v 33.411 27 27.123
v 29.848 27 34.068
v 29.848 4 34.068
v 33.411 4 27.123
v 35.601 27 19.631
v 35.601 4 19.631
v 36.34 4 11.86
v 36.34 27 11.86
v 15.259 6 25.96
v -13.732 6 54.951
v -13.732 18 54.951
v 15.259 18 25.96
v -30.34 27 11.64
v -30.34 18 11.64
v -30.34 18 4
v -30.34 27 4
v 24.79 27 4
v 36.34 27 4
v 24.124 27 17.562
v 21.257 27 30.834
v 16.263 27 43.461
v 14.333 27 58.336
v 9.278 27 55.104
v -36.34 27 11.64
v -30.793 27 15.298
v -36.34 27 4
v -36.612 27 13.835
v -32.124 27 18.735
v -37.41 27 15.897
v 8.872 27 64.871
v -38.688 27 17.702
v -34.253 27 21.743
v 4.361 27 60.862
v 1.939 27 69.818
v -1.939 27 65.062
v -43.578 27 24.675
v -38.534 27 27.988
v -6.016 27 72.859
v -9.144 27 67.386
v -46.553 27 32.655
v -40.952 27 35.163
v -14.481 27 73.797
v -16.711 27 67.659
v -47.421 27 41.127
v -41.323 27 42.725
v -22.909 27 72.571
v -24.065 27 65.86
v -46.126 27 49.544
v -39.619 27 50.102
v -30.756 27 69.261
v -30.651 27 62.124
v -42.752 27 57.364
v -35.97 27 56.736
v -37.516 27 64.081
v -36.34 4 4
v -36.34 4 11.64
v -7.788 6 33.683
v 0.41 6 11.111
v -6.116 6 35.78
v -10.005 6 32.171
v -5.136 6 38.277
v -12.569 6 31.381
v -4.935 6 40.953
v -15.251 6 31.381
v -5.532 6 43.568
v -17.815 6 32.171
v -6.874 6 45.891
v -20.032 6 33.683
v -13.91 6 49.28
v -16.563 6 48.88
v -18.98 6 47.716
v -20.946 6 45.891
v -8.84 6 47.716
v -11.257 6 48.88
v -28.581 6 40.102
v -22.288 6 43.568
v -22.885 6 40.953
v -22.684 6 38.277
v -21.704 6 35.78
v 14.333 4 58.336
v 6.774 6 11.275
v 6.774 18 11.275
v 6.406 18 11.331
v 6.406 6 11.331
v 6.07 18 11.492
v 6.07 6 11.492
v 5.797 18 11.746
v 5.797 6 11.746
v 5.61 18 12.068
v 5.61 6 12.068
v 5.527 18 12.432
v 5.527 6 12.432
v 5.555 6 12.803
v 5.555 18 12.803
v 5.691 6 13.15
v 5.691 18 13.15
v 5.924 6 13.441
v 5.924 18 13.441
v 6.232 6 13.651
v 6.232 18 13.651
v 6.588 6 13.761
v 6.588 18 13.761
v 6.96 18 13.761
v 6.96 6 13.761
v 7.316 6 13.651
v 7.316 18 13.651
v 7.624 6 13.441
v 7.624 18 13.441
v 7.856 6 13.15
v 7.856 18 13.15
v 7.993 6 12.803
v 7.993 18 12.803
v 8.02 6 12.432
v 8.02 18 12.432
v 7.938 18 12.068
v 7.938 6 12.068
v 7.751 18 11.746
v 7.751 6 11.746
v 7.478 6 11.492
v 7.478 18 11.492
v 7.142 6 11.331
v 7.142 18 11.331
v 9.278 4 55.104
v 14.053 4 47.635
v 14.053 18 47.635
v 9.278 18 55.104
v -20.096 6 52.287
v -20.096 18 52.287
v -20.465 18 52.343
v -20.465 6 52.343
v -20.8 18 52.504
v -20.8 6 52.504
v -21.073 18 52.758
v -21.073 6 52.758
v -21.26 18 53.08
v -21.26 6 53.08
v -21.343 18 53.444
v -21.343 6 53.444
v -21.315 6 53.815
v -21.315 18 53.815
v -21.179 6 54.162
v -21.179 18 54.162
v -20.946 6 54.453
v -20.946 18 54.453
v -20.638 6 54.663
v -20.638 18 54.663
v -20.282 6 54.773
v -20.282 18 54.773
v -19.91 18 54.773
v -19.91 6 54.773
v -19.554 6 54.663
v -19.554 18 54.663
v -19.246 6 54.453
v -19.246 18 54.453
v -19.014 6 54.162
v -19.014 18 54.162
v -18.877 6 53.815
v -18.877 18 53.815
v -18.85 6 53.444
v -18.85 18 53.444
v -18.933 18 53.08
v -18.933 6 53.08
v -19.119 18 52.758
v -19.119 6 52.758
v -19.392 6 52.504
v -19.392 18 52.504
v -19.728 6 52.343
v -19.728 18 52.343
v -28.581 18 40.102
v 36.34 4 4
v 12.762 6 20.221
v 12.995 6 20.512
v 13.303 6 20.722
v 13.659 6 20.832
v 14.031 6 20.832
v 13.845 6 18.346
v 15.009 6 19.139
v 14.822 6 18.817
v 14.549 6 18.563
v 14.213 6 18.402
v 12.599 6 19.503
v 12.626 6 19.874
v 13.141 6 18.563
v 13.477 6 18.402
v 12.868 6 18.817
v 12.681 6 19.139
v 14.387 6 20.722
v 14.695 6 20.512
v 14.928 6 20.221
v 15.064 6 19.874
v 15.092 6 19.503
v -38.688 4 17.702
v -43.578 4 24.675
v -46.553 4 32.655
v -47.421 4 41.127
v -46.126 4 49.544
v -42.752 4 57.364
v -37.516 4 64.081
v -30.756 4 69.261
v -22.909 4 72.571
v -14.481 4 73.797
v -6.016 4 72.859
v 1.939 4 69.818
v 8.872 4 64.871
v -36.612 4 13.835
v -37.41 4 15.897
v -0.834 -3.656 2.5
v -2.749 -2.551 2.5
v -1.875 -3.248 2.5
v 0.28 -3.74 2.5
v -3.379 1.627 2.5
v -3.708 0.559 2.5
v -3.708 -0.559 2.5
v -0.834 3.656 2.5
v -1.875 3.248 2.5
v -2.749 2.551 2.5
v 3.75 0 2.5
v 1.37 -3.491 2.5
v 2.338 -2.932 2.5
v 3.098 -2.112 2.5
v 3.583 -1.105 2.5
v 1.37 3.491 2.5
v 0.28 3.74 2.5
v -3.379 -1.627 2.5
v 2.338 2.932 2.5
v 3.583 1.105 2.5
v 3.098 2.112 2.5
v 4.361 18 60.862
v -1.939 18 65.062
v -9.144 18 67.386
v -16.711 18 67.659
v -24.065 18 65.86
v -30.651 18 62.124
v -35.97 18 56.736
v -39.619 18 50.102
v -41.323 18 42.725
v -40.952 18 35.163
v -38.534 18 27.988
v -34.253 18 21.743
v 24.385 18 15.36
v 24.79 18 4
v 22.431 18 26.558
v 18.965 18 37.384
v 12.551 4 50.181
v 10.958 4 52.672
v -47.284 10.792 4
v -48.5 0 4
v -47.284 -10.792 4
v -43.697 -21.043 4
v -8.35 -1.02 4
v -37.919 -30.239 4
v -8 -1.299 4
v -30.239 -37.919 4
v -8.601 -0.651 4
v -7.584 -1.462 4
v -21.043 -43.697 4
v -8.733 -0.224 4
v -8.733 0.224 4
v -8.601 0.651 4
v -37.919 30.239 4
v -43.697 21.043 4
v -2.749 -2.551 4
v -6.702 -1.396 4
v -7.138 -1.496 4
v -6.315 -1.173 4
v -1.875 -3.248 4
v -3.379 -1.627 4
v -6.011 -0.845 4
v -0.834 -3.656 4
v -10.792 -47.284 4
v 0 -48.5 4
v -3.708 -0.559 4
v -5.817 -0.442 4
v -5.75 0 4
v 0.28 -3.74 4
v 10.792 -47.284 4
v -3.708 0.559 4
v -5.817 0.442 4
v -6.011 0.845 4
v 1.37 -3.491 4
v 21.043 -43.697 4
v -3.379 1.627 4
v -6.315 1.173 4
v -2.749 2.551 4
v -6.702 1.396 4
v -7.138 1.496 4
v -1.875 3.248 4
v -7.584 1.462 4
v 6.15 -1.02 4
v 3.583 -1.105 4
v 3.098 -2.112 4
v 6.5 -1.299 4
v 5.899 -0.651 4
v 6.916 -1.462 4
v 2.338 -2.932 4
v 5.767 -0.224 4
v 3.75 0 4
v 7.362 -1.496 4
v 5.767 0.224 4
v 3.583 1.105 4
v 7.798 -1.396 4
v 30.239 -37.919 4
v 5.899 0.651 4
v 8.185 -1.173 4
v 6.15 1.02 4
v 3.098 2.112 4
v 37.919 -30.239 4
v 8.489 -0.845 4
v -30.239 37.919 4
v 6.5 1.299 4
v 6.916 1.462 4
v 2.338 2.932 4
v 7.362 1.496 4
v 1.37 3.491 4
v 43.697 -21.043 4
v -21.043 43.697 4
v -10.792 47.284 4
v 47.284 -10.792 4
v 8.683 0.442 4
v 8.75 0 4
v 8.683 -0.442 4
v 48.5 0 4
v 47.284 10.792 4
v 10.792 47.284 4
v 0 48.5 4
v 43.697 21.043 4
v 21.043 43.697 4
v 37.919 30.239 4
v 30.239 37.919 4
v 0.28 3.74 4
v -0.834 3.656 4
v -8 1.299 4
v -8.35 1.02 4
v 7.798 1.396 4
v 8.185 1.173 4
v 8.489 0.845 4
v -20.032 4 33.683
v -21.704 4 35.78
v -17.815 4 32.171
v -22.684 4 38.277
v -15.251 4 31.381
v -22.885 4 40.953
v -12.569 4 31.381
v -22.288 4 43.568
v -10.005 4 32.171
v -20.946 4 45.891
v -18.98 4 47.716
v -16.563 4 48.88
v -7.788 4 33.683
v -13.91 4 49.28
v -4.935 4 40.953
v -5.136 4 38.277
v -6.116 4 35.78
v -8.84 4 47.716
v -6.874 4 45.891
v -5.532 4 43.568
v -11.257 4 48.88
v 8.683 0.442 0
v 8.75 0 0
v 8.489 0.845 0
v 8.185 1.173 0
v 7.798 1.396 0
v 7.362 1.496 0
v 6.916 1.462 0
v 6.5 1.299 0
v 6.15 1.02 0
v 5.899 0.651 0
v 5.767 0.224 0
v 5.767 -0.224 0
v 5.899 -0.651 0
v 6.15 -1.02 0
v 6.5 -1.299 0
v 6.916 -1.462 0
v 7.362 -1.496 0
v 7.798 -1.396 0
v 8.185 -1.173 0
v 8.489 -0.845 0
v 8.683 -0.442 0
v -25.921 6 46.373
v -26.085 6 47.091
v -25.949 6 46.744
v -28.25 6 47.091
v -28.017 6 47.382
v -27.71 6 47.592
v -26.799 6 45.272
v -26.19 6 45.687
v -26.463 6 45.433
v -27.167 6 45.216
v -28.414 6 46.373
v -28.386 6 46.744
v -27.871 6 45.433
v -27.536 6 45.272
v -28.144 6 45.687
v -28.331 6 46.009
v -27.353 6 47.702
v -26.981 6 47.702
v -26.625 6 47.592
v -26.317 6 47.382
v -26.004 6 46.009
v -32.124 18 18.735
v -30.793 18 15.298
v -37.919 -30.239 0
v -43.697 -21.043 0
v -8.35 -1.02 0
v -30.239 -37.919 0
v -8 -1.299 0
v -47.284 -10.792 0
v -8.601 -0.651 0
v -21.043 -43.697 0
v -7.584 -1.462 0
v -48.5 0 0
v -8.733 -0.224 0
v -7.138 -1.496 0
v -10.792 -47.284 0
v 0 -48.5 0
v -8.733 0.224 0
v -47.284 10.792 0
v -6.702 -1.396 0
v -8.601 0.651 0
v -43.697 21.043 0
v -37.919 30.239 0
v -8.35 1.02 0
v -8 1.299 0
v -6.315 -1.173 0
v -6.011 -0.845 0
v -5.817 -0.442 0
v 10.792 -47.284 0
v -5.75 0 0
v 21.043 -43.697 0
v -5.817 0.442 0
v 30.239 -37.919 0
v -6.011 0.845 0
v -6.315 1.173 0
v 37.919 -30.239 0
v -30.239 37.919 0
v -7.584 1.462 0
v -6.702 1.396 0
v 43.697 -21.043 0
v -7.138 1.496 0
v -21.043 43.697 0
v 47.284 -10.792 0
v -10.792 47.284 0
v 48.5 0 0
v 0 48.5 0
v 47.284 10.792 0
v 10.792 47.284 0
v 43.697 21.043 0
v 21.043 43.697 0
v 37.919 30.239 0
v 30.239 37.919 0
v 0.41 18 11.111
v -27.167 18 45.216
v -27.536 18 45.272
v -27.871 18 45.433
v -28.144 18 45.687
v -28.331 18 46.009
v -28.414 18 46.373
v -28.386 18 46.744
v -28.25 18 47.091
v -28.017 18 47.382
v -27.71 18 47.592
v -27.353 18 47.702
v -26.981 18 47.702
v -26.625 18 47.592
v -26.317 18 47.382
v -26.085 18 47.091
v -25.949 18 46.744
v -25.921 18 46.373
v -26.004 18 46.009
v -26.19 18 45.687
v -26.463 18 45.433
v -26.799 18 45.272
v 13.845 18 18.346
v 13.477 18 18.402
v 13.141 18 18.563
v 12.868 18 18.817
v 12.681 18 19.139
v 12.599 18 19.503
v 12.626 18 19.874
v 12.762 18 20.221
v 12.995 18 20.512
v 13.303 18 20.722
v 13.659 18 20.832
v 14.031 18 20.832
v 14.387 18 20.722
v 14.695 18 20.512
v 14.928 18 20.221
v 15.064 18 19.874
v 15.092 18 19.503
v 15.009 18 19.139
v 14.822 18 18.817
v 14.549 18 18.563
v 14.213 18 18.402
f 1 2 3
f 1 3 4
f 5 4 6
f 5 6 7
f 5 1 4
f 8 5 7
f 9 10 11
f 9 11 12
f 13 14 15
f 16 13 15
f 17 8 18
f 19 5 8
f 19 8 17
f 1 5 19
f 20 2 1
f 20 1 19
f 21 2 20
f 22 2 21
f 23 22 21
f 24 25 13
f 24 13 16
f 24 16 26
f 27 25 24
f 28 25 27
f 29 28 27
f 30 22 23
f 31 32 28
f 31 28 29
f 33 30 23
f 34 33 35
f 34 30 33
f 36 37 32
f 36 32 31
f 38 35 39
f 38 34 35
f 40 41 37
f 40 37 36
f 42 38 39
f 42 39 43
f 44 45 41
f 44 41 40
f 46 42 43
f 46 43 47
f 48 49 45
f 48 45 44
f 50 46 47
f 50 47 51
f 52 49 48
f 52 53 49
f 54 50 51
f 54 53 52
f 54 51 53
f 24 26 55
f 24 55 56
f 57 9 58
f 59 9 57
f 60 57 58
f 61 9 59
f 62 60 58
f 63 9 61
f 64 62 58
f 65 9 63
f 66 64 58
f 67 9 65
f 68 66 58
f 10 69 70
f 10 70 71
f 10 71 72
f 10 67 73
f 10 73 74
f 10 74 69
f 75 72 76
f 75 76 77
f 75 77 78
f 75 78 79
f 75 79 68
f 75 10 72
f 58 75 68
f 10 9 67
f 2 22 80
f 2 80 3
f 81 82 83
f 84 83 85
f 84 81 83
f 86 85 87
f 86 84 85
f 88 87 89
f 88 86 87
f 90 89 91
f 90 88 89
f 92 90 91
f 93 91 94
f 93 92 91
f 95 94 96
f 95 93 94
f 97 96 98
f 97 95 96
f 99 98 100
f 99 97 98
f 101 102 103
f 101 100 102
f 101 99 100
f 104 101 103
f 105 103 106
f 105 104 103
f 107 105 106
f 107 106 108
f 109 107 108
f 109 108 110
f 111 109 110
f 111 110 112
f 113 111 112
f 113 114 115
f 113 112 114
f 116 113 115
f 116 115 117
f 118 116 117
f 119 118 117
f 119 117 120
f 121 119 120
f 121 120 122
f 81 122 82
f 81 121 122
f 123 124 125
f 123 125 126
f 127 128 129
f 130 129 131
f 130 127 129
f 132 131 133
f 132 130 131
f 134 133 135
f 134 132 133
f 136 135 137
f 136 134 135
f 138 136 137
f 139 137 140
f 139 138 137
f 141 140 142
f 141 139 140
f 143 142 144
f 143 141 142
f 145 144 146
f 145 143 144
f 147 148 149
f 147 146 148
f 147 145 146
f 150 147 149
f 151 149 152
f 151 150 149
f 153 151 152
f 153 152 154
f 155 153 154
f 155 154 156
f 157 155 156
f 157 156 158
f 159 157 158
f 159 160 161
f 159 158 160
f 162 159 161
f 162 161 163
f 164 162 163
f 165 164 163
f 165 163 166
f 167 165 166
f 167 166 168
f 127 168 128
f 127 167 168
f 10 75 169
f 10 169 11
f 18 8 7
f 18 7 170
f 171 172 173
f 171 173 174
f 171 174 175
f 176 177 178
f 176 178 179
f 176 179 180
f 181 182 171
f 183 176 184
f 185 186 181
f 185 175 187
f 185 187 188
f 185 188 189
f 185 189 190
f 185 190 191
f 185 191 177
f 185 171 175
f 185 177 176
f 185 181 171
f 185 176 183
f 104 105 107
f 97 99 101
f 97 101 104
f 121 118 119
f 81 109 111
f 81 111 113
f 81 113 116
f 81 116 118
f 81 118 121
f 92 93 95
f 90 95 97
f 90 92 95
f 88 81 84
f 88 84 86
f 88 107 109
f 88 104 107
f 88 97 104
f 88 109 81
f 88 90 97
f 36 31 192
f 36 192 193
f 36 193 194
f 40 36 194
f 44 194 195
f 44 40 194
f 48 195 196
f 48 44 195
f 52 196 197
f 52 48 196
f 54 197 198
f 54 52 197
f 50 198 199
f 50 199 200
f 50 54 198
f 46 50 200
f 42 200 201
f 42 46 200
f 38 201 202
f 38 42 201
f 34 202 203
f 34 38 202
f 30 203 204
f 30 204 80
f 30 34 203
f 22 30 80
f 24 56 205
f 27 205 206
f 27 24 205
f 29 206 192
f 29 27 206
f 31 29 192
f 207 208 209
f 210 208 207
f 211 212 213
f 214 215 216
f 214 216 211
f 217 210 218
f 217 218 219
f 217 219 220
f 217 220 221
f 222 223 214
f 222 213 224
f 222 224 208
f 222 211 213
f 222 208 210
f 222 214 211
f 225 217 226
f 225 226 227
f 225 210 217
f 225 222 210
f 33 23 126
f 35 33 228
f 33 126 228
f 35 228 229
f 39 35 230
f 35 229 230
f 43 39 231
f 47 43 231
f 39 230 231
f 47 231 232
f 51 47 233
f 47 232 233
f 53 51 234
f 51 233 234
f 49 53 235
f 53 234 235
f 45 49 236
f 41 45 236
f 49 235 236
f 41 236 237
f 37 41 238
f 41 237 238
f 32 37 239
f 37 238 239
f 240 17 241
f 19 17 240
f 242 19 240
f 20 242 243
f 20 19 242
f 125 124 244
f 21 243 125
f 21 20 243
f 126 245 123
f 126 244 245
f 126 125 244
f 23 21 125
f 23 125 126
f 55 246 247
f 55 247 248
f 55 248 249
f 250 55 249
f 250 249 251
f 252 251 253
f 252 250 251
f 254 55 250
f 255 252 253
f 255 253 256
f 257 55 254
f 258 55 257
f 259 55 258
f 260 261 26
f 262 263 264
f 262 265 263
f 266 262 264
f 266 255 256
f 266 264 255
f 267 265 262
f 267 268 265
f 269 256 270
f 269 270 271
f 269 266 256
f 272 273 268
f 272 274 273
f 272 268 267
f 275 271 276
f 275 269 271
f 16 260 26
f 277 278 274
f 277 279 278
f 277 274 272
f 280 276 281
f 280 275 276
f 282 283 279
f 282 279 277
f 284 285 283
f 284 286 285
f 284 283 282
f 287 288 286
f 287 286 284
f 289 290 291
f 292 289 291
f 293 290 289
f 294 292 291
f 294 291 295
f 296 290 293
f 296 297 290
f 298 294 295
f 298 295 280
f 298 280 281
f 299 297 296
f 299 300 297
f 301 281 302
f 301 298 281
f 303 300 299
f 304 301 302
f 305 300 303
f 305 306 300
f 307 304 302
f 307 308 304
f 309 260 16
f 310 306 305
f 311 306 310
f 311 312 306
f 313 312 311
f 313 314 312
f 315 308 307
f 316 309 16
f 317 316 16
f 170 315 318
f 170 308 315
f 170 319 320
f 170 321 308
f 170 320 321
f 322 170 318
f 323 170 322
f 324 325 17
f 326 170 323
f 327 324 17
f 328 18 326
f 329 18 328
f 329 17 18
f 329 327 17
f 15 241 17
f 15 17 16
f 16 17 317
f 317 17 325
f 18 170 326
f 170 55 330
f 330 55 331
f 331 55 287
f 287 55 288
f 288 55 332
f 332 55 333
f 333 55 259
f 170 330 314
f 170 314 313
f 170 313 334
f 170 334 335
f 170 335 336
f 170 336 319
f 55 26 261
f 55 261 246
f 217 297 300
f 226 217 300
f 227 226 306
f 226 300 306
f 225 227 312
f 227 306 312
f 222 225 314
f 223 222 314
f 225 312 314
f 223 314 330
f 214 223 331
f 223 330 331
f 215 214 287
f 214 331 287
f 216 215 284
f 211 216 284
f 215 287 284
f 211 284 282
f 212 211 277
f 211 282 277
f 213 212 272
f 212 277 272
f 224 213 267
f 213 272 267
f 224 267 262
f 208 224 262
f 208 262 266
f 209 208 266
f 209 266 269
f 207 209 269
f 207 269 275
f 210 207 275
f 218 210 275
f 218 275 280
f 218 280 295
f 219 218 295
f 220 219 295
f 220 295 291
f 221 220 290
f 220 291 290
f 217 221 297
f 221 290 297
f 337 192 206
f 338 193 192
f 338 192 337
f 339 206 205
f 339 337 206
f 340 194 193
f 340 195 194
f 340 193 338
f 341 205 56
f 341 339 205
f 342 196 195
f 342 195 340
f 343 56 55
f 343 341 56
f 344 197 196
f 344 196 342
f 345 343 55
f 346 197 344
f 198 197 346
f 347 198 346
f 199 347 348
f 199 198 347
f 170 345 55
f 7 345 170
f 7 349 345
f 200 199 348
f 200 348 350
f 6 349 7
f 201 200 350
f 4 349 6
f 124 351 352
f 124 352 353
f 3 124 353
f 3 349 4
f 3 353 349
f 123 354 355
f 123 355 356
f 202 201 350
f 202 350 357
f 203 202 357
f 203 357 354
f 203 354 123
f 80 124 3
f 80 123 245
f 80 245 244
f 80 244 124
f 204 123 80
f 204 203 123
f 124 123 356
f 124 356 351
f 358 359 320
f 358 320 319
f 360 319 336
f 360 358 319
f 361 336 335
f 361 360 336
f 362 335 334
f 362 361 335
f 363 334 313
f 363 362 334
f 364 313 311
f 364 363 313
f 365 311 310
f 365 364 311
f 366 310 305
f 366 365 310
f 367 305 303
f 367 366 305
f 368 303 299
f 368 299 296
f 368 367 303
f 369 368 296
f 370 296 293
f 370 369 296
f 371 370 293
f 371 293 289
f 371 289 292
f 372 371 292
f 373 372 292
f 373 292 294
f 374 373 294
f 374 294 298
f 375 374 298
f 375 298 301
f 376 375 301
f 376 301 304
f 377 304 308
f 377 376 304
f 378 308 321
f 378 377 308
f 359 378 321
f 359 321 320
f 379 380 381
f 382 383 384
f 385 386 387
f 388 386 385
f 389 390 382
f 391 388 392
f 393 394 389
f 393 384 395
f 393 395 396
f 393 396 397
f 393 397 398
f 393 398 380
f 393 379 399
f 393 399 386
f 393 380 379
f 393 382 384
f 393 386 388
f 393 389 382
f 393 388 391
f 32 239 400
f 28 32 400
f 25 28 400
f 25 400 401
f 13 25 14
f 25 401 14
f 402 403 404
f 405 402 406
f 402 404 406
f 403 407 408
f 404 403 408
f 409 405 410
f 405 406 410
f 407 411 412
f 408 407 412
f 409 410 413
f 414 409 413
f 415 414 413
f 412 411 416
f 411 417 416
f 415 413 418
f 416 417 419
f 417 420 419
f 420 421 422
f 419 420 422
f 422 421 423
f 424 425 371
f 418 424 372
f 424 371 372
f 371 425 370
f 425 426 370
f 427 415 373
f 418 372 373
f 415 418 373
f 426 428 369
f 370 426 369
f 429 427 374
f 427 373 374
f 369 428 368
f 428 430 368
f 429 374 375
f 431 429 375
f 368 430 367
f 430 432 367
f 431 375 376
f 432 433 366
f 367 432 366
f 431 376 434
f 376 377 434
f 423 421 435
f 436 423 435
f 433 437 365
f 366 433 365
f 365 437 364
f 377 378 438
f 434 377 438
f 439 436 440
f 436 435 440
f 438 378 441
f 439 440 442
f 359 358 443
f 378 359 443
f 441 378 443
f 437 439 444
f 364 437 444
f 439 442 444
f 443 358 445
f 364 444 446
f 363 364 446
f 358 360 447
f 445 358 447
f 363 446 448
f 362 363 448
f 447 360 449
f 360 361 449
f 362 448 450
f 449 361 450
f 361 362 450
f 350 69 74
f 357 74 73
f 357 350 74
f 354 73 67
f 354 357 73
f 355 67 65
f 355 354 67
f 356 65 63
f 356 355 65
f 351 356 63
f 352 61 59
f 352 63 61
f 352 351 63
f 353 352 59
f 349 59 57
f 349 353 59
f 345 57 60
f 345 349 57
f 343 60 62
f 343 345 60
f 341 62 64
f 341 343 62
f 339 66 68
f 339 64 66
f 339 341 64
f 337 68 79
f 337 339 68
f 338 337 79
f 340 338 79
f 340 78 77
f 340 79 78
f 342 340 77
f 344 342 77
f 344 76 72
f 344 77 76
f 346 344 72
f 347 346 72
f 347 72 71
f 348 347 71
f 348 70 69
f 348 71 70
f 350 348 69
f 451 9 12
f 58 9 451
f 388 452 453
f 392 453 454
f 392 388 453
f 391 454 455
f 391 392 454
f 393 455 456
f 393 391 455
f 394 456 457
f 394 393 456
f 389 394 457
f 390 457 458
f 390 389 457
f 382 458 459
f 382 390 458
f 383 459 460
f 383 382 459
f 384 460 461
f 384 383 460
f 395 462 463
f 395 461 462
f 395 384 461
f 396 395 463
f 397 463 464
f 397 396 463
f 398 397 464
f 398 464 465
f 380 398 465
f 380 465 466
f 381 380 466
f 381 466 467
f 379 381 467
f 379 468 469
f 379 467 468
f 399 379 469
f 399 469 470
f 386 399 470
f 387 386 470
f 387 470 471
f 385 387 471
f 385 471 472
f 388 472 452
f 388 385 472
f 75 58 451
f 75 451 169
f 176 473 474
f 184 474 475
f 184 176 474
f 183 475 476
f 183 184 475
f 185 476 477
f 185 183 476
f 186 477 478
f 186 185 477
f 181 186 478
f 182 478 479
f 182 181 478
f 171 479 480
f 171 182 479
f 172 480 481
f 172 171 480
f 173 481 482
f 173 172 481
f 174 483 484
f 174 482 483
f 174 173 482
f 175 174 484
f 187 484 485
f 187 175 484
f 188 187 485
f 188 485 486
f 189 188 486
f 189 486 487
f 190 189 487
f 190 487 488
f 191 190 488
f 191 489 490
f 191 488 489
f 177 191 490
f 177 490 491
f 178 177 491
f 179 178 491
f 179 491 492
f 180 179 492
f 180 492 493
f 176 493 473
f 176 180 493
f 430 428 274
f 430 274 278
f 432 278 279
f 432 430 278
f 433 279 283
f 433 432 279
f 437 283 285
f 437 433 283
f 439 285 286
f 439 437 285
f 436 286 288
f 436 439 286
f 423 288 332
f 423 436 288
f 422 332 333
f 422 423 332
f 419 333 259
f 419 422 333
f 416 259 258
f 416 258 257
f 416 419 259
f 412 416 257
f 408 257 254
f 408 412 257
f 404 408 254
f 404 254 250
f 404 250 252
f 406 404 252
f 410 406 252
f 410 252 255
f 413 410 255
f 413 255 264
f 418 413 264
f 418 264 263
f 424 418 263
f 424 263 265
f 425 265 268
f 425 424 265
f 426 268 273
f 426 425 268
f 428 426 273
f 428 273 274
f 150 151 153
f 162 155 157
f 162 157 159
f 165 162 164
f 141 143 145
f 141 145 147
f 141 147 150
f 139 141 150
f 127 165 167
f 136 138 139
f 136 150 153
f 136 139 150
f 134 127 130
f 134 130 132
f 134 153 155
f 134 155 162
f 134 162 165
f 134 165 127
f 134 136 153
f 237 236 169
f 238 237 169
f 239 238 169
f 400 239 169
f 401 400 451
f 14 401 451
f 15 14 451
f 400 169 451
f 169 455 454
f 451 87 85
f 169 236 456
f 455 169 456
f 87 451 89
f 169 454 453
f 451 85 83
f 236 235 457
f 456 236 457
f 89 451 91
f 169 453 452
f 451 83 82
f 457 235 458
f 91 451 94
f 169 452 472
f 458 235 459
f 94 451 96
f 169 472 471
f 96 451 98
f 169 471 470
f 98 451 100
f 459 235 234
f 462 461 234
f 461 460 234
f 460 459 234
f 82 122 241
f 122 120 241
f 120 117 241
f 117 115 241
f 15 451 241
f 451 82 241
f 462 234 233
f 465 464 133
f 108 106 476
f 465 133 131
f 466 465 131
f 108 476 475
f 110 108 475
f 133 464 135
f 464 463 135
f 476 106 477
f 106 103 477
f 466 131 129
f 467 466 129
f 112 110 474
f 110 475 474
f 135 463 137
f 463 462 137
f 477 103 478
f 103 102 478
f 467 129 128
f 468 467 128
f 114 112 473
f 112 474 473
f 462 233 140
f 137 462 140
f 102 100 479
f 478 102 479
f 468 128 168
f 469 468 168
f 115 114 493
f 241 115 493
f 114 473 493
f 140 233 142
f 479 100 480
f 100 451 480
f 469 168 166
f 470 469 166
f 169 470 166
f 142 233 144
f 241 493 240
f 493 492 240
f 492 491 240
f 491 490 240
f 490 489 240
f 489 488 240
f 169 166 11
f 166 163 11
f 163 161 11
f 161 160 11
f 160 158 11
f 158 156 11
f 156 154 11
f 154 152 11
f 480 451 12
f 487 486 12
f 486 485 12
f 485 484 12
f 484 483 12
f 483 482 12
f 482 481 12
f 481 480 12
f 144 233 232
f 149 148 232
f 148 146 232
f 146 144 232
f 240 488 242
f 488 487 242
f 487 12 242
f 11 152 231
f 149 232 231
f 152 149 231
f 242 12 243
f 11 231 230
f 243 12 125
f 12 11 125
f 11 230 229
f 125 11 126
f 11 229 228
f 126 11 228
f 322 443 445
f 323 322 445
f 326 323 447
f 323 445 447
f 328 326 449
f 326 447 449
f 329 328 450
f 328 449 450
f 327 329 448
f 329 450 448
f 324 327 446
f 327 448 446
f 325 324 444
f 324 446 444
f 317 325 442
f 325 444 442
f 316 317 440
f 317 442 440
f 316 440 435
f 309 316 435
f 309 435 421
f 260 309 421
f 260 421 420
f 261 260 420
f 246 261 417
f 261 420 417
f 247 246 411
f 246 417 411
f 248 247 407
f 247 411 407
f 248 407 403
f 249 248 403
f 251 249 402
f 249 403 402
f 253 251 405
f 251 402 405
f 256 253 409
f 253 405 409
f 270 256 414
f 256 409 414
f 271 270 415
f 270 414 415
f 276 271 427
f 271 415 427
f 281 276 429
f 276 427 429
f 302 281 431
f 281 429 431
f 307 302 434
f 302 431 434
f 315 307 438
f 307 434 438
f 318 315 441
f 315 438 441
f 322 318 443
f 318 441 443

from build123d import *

# Parameters (mm, degrees)
SKETCH1_R                       = 48.5
SKETCH1_R_2                     = 1.5
BOSS_EXTRUDE1_DEPTH             = 4
SKETCH2_R                       = 3.75
CUT_EXTRUDE1_DEPTH              = 1.5
BOSS_EXTRUDE2_START             = 4
SKETCH3_R                       = 9
BOSS_EXTRUDE2_DEPTH             = 14
CUT_EXTRUDE2_START              = 6
SKETCH4_R                       = 1.25
CUT_EXTRUDE2_DEPTH              = 91.444646155
BOSS_EXTRUDE3_DEPTH             = 9
BOSS_EXTRUDE3_DIRECTION_2_REACH = 108.638


with BuildPart() as part:
    # Sketch1 → Boss-Extrude1 (new body)
    with BuildSketch(Plane(origin=(0, 0, 0), x_dir=(0, 1, 0), z_dir=(0, 0, 1))):
        with Locations(Location((0, 0, 0), (0, 0, 270))):
            Circle(SKETCH1_R)
        with Locations(Location((0, 7.25, 0), (0, 0, 270))):
            Circle(SKETCH1_R_2, mode=Mode.SUBTRACT)
        with Locations(Location((0, -7.25, 0), (0, 0, 270))):
            Circle(SKETCH1_R_2, mode=Mode.SUBTRACT)
    extrude(amount=BOSS_EXTRUDE1_DEPTH)

    # Sketch2 → Cut-Extrude1 (cut)
    with BuildSketch(Plane.XY.offset(4)):
        Circle(SKETCH2_R)
    extrude(amount=-CUT_EXTRUDE1_DEPTH, mode=Mode.SUBTRACT)

    # Sketch3 → Boss-Extrude2 (add)
    with BuildSketch(Plane(origin=(0, 0, 0), x_dir=(-1, 0, 0), z_dir=(0, 1, 0)).offset(BOSS_EXTRUDE2_START)):
        with BuildLine():
            Line((-30.34, 4), (-30.34, 11.86))
            ThreePointArc((-30.34, 11.86), (-28.924736696, 21.745164753), (-24.792654999, 30.836113728))
            Line((-24.792654999, 30.836113728), (-9.278105641, 55.104149989))
            ThreePointArc((-9.278105641, 55.104149989), (30.651097233, 62.12443475), (34.252718415, 21.743078098))
            ThreePointArc((34.252718415, 21.743078098), (31.352340729, 17.057138369), (30.34, 11.64))
            Line((30.34, 11.64), (30.34, 4))
            Line((30.34, 4), (-30.34, 4))
        make_face()
        with Locations(Location((13.91, 40.28, 0), (0, 0, 90))):
            Circle(SKETCH3_R, mode=Mode.SUBTRACT)
    extrude(amount=BOSS_EXTRUDE2_DEPTH)

    # Sketch4 → Cut-Extrude2 (cut, through all)
    with BuildSketch(Plane(origin=(0, 0, 0), x_dir=(-1, 0, 0), z_dir=(0, 1, 0)).offset(CUT_EXTRUDE2_START)):
        with Locations(Location((20.096096654, 53.537164466, 0), (0, 0, 270))):
            Circle(SKETCH4_R)
        with Locations(Location((27.167164466, 46.466096654, 0), (0, 0, 270))):
            Circle(SKETCH4_R)
        with Locations(Location((-6.773961031, 12.524971157, 0), (0, 0, 270))):
            Circle(SKETCH4_R)
        with Locations(Location((-13.845028843, 19.596038969, 0), (0, 0, 270))):
            Circle(SKETCH4_R)
        Polygon((-0.41, 11.110757595), (28.581378029, 40.102135624), (13.732135624, 54.951378029), (-15.259242405, 25.96), align=None)
    extrude(amount=CUT_EXTRUDE2_DEPTH, mode=Mode.SUBTRACT)

    # Sketch5 → Boss-Extrude3 (add)
    with BuildSketch(Plane(origin=(0, 18, 0), x_dir=(-1, 0, 0), z_dir=(0, 1, 0))):
        with BuildLine():
            Line((36.34, 4), (36.34, 11.64))
            ThreePointArc((36.34, 11.64), (36.947404437, 14.890283021), (38.687631049, 17.701846859))
            ThreePointArc((38.687631049, 17.701846859), (34.300821036, 66.886736311), (-14.333340667, 58.335960445))
            Line((-14.333340667, 58.335960445), (-29.847890025, 34.067924184))
            ThreePointArc((-29.847890025, 34.067924184), (-34.683704058, 23.428701186), (-36.34, 11.86))
            Line((-36.34, 11.86), (-36.34, 4))
            Line((-36.34, 4), (-33.34, 4))
            Line((-33.34, 4), (-30.34, 4))
            Line((-30.34, 4), (-24.79, 4))
            ThreePointArc((-24.79, 4), (-21.256686804, 30.833791886), (-9.278105641, 55.104149989))
            ThreePointArc((-9.278105641, 55.104149989), (30.651097233, 62.12443475), (34.252718415, 21.743078098))
            ThreePointArc((34.252718415, 21.743078098), (31.352340729, 17.057138369), (30.34, 11.64))
            Line((30.34, 11.64), (30.34, 4))
            Line((30.34, 4), (33.34, 4))
            Line((33.34, 4), (36.34, 4))
        make_face()
    extrude(amount=BOSS_EXTRUDE3_DEPTH)

    # Boss-Extrude3 direction 2: up to this face of the body (flat: up to its plane)
    boss_extrude3_direction_2_end = Plane(part.part.faces().sort_by_distance((-6.762869766, 4, 32.000889593))[0])
    # Sketch5 → Boss-Extrude3 direction 2 (add, up to the picked face)
    with BuildSketch(Plane(origin=(0, 18, 0), x_dir=(-1, 0, 0), z_dir=(0, 1, 0)), mode=Mode.PRIVATE) as boss_extrude3_direction_2_sk1:
        with BuildLine():
            Line((36.34, 4), (36.34, 11.64))
            ThreePointArc((36.34, 11.64), (36.947404437, 14.890283021), (38.687631049, 17.701846859))
            ThreePointArc((38.687631049, 17.701846859), (34.300821036, 66.886736311), (-14.333340667, 58.335960445))
            Line((-14.333340667, 58.335960445), (-29.847890025, 34.067924184))
            ThreePointArc((-29.847890025, 34.067924184), (-34.683704058, 23.428701186), (-36.34, 11.86))
            Line((-36.34, 11.86), (-36.34, 4))
            Line((-36.34, 4), (-33.34, 4))
            Line((-33.34, 4), (-30.34, 4))
            Line((-30.34, 4), (-24.79, 4))
            ThreePointArc((-24.79, 4), (-21.256686804, 30.833791886), (-9.278105641, 55.104149989))
            ThreePointArc((-9.278105641, 55.104149989), (30.651097233, 62.12443475), (34.252718415, 21.743078098))
            ThreePointArc((34.252718415, 21.743078098), (31.352340729, 17.057138369), (30.34, 11.64))
            Line((30.34, 11.64), (30.34, 4))
            Line((30.34, 4), (33.34, 4))
            Line((33.34, 4), (36.34, 4))
        make_face()
    boss_extrude3_direction_2_tool1 = split(extrude(boss_extrude3_direction_2_sk1.sketch, amount=-BOSS_EXTRUDE3_DIRECTION_2_REACH, mode=Mode.PRIVATE), bisect_by=boss_extrude3_direction_2_end, keep=Keep.BOTH, mode=Mode.PRIVATE)
    add(boss_extrude3_direction_2_tool1.solids().sort_by(Axis((-35.249588, 18, 7.82), (0, -1, 0)))[0])


solid = part.part
